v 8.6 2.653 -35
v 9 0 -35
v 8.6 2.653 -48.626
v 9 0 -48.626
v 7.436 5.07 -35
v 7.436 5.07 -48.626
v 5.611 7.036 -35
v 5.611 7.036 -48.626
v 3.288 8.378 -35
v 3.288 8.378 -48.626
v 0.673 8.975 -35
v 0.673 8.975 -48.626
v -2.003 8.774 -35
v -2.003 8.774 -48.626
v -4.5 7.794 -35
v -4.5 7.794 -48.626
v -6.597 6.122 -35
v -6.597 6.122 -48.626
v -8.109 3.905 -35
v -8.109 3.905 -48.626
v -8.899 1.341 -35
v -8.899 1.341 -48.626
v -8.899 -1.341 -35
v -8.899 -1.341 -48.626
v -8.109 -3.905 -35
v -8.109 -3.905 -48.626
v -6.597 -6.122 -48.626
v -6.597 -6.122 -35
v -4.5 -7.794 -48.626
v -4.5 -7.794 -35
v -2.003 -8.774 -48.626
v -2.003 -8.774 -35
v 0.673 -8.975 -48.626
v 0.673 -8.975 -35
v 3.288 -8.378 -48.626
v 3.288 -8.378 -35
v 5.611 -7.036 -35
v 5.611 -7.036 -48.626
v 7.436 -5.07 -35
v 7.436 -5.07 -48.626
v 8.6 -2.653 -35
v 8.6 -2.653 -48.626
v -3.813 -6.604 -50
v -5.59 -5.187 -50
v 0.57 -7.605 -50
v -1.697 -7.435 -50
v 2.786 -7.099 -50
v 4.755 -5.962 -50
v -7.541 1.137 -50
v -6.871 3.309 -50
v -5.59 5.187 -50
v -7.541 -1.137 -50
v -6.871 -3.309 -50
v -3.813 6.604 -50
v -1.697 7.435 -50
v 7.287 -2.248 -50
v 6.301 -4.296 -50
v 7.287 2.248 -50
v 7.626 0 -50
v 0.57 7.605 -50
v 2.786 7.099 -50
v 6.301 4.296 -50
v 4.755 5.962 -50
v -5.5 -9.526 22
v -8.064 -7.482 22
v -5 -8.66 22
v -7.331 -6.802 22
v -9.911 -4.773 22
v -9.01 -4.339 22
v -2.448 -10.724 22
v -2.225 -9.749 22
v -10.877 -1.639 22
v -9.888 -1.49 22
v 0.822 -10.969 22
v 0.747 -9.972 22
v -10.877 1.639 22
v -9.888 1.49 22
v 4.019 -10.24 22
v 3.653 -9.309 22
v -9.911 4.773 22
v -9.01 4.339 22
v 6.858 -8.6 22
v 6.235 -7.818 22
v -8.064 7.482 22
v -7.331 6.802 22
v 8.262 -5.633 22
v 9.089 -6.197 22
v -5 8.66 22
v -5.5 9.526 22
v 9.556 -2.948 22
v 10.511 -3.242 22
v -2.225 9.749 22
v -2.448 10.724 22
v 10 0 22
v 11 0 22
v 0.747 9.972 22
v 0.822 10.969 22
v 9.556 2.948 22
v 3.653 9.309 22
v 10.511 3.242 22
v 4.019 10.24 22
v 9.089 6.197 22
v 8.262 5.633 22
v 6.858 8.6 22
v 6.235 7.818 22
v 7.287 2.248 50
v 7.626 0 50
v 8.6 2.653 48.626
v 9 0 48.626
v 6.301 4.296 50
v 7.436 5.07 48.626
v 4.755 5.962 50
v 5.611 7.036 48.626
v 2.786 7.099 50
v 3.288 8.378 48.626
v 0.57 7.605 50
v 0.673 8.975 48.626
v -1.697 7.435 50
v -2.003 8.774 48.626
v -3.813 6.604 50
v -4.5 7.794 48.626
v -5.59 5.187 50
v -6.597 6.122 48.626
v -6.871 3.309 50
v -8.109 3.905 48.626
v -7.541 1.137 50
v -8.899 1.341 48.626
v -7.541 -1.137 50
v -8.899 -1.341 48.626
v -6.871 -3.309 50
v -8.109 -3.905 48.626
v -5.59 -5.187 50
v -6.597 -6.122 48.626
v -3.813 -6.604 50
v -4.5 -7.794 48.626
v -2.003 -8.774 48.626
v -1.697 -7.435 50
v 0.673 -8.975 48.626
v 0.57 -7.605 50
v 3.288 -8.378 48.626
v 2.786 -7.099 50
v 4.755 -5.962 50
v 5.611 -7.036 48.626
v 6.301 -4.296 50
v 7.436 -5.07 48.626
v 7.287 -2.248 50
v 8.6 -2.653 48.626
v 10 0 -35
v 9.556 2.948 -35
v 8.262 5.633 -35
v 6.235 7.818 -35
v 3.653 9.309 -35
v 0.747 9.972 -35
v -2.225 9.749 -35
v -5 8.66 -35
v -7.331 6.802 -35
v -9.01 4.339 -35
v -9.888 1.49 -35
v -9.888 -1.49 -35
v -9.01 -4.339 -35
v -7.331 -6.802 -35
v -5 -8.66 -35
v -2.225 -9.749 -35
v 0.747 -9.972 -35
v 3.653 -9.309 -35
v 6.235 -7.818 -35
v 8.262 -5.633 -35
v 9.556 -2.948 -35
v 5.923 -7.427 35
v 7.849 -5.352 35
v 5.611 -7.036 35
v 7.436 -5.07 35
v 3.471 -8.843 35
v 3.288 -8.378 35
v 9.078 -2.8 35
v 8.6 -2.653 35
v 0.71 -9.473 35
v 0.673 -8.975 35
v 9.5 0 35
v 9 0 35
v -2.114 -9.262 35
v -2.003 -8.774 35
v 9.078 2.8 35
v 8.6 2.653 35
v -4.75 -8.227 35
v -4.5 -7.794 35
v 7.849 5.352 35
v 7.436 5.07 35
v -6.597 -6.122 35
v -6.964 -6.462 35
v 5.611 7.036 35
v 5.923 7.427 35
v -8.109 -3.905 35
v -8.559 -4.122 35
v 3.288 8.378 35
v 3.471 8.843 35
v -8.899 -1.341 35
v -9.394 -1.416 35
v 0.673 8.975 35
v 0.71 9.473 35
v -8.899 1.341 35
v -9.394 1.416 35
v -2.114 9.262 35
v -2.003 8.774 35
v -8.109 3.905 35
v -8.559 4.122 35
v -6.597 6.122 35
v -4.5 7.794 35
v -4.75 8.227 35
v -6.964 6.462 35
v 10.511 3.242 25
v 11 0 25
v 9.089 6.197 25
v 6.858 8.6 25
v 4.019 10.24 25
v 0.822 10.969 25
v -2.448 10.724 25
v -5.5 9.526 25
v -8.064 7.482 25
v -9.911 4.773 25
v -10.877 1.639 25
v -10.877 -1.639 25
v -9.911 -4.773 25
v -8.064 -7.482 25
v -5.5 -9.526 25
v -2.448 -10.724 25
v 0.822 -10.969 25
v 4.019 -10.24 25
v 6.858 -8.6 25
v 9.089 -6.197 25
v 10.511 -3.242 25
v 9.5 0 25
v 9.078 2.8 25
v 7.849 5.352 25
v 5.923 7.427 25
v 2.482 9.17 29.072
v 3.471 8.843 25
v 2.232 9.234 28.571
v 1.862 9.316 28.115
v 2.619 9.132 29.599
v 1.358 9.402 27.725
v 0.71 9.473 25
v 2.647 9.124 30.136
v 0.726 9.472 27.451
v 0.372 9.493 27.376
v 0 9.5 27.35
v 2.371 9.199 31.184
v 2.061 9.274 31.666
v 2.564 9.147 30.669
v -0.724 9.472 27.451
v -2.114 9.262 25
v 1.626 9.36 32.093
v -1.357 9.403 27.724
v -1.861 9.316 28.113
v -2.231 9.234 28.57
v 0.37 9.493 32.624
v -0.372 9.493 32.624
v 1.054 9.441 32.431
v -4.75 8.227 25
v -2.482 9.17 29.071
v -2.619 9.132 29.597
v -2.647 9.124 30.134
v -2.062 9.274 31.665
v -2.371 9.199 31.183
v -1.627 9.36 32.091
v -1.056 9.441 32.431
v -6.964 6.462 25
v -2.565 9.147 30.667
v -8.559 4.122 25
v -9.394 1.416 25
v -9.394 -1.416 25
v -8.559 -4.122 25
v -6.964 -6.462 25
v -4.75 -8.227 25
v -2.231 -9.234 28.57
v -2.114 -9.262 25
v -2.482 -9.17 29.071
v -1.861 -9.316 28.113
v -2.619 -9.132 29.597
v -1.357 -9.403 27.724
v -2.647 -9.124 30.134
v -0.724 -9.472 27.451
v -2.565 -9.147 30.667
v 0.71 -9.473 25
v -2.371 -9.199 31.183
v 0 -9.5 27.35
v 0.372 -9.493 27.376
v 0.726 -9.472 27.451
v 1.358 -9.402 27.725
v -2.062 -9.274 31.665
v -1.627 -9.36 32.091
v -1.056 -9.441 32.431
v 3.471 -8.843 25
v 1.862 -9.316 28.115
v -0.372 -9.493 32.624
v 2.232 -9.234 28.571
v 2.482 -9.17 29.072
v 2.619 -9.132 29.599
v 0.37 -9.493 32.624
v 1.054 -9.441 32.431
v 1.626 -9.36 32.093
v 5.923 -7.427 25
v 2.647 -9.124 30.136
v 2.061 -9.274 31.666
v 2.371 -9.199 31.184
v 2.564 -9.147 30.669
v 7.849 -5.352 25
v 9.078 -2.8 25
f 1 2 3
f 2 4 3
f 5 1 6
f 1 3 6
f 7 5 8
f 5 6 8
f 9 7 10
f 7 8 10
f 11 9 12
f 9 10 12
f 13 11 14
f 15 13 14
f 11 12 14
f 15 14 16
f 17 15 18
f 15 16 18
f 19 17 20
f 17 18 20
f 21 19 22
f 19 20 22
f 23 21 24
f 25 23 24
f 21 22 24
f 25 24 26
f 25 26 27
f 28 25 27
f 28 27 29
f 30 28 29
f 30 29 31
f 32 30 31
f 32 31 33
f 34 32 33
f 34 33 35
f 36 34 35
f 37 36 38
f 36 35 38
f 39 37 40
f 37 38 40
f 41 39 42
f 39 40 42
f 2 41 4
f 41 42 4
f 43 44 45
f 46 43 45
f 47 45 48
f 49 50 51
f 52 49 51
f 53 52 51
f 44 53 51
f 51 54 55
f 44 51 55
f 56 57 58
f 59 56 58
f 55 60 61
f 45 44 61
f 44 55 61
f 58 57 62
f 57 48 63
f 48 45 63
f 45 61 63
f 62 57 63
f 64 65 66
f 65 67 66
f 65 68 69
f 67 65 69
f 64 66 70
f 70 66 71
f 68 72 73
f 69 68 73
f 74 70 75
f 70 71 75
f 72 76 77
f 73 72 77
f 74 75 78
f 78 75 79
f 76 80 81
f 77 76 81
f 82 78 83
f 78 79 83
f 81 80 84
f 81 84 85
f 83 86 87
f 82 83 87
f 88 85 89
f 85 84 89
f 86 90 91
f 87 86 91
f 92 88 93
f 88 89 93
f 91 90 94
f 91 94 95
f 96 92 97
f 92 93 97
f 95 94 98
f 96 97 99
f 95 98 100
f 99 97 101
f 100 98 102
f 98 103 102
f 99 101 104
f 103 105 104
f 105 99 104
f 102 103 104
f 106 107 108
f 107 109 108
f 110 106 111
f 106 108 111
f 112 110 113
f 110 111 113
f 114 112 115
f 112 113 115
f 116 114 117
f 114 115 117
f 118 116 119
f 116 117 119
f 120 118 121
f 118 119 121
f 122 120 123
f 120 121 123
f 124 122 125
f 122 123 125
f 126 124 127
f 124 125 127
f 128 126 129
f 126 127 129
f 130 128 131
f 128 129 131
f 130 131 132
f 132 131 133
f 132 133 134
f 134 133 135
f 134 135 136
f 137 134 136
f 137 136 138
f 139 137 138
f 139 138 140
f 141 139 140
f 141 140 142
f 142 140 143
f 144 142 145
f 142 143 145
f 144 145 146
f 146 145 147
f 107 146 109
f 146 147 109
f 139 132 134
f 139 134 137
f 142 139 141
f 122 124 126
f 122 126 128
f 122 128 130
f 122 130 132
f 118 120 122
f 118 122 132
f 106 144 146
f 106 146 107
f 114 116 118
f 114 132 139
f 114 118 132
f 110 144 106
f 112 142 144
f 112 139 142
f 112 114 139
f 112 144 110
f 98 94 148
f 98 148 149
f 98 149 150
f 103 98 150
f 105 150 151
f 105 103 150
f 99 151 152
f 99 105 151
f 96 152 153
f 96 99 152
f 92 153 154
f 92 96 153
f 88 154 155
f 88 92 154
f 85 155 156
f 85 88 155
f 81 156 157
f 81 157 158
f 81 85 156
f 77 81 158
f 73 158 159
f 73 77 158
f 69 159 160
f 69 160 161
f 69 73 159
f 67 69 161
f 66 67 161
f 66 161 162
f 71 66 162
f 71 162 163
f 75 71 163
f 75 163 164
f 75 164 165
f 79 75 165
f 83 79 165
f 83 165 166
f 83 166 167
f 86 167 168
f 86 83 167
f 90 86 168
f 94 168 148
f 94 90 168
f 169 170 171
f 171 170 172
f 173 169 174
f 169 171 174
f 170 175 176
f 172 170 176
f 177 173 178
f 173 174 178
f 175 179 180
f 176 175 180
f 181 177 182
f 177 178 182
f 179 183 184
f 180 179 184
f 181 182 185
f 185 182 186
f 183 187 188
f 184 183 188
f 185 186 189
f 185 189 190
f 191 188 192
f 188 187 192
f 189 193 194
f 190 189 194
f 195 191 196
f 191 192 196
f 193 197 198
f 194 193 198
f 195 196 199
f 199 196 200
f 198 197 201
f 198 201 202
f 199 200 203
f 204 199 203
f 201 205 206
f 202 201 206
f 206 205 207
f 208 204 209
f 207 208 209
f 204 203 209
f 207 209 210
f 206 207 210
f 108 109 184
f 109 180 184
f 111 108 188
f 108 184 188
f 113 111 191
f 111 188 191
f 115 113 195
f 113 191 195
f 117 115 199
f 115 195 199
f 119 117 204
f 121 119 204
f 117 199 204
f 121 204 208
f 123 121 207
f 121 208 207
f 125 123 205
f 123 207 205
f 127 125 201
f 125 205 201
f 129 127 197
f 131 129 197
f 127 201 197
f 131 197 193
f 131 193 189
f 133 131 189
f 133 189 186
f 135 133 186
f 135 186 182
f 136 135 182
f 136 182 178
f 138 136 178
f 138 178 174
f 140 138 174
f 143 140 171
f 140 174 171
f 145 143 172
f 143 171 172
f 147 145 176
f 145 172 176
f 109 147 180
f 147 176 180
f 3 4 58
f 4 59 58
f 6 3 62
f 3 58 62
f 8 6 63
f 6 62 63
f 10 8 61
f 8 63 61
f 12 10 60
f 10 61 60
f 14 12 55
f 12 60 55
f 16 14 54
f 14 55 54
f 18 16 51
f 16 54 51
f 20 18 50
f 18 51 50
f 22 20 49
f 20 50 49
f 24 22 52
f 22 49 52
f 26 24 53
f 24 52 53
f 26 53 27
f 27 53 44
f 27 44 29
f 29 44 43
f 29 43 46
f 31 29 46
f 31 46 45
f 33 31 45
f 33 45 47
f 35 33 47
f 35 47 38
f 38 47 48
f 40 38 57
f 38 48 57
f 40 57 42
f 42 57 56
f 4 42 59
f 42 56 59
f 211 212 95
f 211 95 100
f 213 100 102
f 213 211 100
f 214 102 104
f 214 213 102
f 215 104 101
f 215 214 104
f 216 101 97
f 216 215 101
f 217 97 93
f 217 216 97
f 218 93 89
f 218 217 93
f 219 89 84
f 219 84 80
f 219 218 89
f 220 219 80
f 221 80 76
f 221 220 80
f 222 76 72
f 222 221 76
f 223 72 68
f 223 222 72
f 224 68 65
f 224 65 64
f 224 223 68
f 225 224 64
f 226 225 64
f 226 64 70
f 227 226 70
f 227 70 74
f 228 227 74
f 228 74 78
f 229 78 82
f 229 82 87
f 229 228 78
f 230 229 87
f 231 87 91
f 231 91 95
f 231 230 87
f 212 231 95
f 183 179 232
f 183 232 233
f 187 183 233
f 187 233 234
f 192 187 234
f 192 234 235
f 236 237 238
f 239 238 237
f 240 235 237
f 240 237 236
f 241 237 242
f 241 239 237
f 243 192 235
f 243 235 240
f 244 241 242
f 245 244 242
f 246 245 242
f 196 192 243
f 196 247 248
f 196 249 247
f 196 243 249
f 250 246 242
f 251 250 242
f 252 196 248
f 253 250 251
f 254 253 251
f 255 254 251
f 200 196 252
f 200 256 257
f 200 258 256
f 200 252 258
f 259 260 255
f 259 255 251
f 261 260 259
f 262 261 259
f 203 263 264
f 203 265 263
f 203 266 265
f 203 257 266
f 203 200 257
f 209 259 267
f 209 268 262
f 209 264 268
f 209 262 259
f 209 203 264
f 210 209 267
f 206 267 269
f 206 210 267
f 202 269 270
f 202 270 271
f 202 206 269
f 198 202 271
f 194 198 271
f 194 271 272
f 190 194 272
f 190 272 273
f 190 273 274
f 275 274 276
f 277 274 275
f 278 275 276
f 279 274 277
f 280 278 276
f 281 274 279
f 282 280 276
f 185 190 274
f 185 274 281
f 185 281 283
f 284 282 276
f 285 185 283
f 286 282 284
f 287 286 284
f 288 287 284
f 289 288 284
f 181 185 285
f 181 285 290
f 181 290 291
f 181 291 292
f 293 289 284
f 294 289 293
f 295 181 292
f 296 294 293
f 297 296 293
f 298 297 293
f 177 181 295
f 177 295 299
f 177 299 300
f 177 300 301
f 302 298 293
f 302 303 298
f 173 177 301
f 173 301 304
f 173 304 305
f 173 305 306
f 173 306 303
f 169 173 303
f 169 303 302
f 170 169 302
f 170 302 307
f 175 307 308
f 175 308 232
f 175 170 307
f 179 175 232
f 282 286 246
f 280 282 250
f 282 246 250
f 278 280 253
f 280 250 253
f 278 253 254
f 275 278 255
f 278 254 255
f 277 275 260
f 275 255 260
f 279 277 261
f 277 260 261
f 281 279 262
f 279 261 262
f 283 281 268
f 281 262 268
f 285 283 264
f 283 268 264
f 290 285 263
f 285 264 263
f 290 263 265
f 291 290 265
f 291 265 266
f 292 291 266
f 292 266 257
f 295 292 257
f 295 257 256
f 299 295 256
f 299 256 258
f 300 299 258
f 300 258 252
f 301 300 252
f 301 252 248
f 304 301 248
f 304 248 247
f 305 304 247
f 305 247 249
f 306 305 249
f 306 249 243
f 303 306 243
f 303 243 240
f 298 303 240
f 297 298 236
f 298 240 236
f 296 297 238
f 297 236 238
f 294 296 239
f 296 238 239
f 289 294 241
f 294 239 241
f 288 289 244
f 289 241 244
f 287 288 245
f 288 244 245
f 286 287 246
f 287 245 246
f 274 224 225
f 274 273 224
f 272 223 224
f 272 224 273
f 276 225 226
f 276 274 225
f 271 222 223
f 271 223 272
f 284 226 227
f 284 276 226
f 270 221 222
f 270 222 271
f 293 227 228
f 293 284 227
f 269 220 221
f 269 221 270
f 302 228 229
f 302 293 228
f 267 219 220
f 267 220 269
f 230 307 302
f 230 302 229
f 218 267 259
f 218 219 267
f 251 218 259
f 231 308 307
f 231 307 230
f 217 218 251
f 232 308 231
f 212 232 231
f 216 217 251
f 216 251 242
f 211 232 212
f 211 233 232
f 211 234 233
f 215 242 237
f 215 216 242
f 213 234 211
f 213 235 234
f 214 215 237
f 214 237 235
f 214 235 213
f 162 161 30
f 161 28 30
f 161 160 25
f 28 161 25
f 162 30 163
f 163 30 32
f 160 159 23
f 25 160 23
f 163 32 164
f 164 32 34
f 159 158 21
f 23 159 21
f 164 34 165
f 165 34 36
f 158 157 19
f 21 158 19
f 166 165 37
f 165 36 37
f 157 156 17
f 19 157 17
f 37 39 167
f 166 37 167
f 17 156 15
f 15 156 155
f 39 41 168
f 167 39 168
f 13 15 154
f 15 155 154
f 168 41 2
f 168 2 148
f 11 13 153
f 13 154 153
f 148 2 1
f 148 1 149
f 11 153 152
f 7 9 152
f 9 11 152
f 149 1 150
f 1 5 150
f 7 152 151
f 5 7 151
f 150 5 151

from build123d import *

# Parameters (mm, degrees)
SKETCH1_R           = 10
BOSS_EXTRUDE1_DEPTH = 50
SKETCH7_R           = 10
SKETCH7_R_2         = 9.5
CUT_EXTRUDE1_DEPTH  = 10
SKETCH10_W          = 2.65
SKETCH10_H          = 10
SKETCH11_R          = 11
BOSS_EXTRUDE2_DEPTH = 3


# Read off the part's stored shape, not the designer's step: M18x2.5 Machine Threads Stud1, M18x2.5 Machine Threads Stud2
with BuildPart() as part:
    # Sketch1 → Boss-Extrude1 (new, symmetric)
    with BuildSketch(Plane.XY):
        Circle(SKETCH1_R)
    extrude(amount=BOSS_EXTRUDE1_DEPTH, both=True)

    # M18x2.5 Machine Threads Stud1 outline → M18x2.5 Machine Threads Stud1 (revolve, cut)
    with BuildSketch(Plane.XZ):
        Polygon((7.626, -50), (10, -50), (10, -35), (9, -35), (9, -48.626), align=None)
    revolve(axis=Axis((0, 0, 0), (0, 0, 1)), mode=Mode.SUBTRACT)

    # M18x2.5 Machine Threads Stud2 outline → M18x2.5 Machine Threads Stud2 (revolve, cut)
    with BuildSketch(Plane.XZ):
        Polygon((10, 50), (7.626, 50), (9, 48.626), (9, 35), (10, 35), align=None)
    revolve(axis=Axis((0, 0, 0), (0, 0, 1)), mode=Mode.SUBTRACT)

    # Sketch7 → Cut-Extrude1 (cut)
    with BuildSketch(Plane.XY.offset(35)):
        Circle(SKETCH7_R)
        Circle(SKETCH7_R_2, mode=Mode.SUBTRACT)
    extrude(amount=-CUT_EXTRUDE1_DEPTH, mode=Mode.SUBTRACT)

    # Sketch10 → M5 Clearance Hole1 (revolve, cut)
    with BuildSketch(Plane(origin=(0, 0, 30), x_dir=(0, 0, -1), z_dir=(1, 0, 0))):
        with Locations((1.325, 5)):
            Rectangle(SKETCH10_W, SKETCH10_H)
    m5_clearance_hole1 = revolve(axis=Axis((0, -6.35, 30), (0, 1, 0)), mode=Mode.SUBTRACT)

    # Mirror2: M5 Clearance Hole1 across plane
    add(m5_clearance_hole1.mirror(Plane.ZX), mode=Mode.SUBTRACT)

    # Sketch11 → Boss-Extrude2 (add)
    with BuildSketch(Plane.XY.offset(25)):
        Circle(SKETCH11_R)
    extrude(amount=-BOSS_EXTRUDE2_DEPTH)


solid = part.part
